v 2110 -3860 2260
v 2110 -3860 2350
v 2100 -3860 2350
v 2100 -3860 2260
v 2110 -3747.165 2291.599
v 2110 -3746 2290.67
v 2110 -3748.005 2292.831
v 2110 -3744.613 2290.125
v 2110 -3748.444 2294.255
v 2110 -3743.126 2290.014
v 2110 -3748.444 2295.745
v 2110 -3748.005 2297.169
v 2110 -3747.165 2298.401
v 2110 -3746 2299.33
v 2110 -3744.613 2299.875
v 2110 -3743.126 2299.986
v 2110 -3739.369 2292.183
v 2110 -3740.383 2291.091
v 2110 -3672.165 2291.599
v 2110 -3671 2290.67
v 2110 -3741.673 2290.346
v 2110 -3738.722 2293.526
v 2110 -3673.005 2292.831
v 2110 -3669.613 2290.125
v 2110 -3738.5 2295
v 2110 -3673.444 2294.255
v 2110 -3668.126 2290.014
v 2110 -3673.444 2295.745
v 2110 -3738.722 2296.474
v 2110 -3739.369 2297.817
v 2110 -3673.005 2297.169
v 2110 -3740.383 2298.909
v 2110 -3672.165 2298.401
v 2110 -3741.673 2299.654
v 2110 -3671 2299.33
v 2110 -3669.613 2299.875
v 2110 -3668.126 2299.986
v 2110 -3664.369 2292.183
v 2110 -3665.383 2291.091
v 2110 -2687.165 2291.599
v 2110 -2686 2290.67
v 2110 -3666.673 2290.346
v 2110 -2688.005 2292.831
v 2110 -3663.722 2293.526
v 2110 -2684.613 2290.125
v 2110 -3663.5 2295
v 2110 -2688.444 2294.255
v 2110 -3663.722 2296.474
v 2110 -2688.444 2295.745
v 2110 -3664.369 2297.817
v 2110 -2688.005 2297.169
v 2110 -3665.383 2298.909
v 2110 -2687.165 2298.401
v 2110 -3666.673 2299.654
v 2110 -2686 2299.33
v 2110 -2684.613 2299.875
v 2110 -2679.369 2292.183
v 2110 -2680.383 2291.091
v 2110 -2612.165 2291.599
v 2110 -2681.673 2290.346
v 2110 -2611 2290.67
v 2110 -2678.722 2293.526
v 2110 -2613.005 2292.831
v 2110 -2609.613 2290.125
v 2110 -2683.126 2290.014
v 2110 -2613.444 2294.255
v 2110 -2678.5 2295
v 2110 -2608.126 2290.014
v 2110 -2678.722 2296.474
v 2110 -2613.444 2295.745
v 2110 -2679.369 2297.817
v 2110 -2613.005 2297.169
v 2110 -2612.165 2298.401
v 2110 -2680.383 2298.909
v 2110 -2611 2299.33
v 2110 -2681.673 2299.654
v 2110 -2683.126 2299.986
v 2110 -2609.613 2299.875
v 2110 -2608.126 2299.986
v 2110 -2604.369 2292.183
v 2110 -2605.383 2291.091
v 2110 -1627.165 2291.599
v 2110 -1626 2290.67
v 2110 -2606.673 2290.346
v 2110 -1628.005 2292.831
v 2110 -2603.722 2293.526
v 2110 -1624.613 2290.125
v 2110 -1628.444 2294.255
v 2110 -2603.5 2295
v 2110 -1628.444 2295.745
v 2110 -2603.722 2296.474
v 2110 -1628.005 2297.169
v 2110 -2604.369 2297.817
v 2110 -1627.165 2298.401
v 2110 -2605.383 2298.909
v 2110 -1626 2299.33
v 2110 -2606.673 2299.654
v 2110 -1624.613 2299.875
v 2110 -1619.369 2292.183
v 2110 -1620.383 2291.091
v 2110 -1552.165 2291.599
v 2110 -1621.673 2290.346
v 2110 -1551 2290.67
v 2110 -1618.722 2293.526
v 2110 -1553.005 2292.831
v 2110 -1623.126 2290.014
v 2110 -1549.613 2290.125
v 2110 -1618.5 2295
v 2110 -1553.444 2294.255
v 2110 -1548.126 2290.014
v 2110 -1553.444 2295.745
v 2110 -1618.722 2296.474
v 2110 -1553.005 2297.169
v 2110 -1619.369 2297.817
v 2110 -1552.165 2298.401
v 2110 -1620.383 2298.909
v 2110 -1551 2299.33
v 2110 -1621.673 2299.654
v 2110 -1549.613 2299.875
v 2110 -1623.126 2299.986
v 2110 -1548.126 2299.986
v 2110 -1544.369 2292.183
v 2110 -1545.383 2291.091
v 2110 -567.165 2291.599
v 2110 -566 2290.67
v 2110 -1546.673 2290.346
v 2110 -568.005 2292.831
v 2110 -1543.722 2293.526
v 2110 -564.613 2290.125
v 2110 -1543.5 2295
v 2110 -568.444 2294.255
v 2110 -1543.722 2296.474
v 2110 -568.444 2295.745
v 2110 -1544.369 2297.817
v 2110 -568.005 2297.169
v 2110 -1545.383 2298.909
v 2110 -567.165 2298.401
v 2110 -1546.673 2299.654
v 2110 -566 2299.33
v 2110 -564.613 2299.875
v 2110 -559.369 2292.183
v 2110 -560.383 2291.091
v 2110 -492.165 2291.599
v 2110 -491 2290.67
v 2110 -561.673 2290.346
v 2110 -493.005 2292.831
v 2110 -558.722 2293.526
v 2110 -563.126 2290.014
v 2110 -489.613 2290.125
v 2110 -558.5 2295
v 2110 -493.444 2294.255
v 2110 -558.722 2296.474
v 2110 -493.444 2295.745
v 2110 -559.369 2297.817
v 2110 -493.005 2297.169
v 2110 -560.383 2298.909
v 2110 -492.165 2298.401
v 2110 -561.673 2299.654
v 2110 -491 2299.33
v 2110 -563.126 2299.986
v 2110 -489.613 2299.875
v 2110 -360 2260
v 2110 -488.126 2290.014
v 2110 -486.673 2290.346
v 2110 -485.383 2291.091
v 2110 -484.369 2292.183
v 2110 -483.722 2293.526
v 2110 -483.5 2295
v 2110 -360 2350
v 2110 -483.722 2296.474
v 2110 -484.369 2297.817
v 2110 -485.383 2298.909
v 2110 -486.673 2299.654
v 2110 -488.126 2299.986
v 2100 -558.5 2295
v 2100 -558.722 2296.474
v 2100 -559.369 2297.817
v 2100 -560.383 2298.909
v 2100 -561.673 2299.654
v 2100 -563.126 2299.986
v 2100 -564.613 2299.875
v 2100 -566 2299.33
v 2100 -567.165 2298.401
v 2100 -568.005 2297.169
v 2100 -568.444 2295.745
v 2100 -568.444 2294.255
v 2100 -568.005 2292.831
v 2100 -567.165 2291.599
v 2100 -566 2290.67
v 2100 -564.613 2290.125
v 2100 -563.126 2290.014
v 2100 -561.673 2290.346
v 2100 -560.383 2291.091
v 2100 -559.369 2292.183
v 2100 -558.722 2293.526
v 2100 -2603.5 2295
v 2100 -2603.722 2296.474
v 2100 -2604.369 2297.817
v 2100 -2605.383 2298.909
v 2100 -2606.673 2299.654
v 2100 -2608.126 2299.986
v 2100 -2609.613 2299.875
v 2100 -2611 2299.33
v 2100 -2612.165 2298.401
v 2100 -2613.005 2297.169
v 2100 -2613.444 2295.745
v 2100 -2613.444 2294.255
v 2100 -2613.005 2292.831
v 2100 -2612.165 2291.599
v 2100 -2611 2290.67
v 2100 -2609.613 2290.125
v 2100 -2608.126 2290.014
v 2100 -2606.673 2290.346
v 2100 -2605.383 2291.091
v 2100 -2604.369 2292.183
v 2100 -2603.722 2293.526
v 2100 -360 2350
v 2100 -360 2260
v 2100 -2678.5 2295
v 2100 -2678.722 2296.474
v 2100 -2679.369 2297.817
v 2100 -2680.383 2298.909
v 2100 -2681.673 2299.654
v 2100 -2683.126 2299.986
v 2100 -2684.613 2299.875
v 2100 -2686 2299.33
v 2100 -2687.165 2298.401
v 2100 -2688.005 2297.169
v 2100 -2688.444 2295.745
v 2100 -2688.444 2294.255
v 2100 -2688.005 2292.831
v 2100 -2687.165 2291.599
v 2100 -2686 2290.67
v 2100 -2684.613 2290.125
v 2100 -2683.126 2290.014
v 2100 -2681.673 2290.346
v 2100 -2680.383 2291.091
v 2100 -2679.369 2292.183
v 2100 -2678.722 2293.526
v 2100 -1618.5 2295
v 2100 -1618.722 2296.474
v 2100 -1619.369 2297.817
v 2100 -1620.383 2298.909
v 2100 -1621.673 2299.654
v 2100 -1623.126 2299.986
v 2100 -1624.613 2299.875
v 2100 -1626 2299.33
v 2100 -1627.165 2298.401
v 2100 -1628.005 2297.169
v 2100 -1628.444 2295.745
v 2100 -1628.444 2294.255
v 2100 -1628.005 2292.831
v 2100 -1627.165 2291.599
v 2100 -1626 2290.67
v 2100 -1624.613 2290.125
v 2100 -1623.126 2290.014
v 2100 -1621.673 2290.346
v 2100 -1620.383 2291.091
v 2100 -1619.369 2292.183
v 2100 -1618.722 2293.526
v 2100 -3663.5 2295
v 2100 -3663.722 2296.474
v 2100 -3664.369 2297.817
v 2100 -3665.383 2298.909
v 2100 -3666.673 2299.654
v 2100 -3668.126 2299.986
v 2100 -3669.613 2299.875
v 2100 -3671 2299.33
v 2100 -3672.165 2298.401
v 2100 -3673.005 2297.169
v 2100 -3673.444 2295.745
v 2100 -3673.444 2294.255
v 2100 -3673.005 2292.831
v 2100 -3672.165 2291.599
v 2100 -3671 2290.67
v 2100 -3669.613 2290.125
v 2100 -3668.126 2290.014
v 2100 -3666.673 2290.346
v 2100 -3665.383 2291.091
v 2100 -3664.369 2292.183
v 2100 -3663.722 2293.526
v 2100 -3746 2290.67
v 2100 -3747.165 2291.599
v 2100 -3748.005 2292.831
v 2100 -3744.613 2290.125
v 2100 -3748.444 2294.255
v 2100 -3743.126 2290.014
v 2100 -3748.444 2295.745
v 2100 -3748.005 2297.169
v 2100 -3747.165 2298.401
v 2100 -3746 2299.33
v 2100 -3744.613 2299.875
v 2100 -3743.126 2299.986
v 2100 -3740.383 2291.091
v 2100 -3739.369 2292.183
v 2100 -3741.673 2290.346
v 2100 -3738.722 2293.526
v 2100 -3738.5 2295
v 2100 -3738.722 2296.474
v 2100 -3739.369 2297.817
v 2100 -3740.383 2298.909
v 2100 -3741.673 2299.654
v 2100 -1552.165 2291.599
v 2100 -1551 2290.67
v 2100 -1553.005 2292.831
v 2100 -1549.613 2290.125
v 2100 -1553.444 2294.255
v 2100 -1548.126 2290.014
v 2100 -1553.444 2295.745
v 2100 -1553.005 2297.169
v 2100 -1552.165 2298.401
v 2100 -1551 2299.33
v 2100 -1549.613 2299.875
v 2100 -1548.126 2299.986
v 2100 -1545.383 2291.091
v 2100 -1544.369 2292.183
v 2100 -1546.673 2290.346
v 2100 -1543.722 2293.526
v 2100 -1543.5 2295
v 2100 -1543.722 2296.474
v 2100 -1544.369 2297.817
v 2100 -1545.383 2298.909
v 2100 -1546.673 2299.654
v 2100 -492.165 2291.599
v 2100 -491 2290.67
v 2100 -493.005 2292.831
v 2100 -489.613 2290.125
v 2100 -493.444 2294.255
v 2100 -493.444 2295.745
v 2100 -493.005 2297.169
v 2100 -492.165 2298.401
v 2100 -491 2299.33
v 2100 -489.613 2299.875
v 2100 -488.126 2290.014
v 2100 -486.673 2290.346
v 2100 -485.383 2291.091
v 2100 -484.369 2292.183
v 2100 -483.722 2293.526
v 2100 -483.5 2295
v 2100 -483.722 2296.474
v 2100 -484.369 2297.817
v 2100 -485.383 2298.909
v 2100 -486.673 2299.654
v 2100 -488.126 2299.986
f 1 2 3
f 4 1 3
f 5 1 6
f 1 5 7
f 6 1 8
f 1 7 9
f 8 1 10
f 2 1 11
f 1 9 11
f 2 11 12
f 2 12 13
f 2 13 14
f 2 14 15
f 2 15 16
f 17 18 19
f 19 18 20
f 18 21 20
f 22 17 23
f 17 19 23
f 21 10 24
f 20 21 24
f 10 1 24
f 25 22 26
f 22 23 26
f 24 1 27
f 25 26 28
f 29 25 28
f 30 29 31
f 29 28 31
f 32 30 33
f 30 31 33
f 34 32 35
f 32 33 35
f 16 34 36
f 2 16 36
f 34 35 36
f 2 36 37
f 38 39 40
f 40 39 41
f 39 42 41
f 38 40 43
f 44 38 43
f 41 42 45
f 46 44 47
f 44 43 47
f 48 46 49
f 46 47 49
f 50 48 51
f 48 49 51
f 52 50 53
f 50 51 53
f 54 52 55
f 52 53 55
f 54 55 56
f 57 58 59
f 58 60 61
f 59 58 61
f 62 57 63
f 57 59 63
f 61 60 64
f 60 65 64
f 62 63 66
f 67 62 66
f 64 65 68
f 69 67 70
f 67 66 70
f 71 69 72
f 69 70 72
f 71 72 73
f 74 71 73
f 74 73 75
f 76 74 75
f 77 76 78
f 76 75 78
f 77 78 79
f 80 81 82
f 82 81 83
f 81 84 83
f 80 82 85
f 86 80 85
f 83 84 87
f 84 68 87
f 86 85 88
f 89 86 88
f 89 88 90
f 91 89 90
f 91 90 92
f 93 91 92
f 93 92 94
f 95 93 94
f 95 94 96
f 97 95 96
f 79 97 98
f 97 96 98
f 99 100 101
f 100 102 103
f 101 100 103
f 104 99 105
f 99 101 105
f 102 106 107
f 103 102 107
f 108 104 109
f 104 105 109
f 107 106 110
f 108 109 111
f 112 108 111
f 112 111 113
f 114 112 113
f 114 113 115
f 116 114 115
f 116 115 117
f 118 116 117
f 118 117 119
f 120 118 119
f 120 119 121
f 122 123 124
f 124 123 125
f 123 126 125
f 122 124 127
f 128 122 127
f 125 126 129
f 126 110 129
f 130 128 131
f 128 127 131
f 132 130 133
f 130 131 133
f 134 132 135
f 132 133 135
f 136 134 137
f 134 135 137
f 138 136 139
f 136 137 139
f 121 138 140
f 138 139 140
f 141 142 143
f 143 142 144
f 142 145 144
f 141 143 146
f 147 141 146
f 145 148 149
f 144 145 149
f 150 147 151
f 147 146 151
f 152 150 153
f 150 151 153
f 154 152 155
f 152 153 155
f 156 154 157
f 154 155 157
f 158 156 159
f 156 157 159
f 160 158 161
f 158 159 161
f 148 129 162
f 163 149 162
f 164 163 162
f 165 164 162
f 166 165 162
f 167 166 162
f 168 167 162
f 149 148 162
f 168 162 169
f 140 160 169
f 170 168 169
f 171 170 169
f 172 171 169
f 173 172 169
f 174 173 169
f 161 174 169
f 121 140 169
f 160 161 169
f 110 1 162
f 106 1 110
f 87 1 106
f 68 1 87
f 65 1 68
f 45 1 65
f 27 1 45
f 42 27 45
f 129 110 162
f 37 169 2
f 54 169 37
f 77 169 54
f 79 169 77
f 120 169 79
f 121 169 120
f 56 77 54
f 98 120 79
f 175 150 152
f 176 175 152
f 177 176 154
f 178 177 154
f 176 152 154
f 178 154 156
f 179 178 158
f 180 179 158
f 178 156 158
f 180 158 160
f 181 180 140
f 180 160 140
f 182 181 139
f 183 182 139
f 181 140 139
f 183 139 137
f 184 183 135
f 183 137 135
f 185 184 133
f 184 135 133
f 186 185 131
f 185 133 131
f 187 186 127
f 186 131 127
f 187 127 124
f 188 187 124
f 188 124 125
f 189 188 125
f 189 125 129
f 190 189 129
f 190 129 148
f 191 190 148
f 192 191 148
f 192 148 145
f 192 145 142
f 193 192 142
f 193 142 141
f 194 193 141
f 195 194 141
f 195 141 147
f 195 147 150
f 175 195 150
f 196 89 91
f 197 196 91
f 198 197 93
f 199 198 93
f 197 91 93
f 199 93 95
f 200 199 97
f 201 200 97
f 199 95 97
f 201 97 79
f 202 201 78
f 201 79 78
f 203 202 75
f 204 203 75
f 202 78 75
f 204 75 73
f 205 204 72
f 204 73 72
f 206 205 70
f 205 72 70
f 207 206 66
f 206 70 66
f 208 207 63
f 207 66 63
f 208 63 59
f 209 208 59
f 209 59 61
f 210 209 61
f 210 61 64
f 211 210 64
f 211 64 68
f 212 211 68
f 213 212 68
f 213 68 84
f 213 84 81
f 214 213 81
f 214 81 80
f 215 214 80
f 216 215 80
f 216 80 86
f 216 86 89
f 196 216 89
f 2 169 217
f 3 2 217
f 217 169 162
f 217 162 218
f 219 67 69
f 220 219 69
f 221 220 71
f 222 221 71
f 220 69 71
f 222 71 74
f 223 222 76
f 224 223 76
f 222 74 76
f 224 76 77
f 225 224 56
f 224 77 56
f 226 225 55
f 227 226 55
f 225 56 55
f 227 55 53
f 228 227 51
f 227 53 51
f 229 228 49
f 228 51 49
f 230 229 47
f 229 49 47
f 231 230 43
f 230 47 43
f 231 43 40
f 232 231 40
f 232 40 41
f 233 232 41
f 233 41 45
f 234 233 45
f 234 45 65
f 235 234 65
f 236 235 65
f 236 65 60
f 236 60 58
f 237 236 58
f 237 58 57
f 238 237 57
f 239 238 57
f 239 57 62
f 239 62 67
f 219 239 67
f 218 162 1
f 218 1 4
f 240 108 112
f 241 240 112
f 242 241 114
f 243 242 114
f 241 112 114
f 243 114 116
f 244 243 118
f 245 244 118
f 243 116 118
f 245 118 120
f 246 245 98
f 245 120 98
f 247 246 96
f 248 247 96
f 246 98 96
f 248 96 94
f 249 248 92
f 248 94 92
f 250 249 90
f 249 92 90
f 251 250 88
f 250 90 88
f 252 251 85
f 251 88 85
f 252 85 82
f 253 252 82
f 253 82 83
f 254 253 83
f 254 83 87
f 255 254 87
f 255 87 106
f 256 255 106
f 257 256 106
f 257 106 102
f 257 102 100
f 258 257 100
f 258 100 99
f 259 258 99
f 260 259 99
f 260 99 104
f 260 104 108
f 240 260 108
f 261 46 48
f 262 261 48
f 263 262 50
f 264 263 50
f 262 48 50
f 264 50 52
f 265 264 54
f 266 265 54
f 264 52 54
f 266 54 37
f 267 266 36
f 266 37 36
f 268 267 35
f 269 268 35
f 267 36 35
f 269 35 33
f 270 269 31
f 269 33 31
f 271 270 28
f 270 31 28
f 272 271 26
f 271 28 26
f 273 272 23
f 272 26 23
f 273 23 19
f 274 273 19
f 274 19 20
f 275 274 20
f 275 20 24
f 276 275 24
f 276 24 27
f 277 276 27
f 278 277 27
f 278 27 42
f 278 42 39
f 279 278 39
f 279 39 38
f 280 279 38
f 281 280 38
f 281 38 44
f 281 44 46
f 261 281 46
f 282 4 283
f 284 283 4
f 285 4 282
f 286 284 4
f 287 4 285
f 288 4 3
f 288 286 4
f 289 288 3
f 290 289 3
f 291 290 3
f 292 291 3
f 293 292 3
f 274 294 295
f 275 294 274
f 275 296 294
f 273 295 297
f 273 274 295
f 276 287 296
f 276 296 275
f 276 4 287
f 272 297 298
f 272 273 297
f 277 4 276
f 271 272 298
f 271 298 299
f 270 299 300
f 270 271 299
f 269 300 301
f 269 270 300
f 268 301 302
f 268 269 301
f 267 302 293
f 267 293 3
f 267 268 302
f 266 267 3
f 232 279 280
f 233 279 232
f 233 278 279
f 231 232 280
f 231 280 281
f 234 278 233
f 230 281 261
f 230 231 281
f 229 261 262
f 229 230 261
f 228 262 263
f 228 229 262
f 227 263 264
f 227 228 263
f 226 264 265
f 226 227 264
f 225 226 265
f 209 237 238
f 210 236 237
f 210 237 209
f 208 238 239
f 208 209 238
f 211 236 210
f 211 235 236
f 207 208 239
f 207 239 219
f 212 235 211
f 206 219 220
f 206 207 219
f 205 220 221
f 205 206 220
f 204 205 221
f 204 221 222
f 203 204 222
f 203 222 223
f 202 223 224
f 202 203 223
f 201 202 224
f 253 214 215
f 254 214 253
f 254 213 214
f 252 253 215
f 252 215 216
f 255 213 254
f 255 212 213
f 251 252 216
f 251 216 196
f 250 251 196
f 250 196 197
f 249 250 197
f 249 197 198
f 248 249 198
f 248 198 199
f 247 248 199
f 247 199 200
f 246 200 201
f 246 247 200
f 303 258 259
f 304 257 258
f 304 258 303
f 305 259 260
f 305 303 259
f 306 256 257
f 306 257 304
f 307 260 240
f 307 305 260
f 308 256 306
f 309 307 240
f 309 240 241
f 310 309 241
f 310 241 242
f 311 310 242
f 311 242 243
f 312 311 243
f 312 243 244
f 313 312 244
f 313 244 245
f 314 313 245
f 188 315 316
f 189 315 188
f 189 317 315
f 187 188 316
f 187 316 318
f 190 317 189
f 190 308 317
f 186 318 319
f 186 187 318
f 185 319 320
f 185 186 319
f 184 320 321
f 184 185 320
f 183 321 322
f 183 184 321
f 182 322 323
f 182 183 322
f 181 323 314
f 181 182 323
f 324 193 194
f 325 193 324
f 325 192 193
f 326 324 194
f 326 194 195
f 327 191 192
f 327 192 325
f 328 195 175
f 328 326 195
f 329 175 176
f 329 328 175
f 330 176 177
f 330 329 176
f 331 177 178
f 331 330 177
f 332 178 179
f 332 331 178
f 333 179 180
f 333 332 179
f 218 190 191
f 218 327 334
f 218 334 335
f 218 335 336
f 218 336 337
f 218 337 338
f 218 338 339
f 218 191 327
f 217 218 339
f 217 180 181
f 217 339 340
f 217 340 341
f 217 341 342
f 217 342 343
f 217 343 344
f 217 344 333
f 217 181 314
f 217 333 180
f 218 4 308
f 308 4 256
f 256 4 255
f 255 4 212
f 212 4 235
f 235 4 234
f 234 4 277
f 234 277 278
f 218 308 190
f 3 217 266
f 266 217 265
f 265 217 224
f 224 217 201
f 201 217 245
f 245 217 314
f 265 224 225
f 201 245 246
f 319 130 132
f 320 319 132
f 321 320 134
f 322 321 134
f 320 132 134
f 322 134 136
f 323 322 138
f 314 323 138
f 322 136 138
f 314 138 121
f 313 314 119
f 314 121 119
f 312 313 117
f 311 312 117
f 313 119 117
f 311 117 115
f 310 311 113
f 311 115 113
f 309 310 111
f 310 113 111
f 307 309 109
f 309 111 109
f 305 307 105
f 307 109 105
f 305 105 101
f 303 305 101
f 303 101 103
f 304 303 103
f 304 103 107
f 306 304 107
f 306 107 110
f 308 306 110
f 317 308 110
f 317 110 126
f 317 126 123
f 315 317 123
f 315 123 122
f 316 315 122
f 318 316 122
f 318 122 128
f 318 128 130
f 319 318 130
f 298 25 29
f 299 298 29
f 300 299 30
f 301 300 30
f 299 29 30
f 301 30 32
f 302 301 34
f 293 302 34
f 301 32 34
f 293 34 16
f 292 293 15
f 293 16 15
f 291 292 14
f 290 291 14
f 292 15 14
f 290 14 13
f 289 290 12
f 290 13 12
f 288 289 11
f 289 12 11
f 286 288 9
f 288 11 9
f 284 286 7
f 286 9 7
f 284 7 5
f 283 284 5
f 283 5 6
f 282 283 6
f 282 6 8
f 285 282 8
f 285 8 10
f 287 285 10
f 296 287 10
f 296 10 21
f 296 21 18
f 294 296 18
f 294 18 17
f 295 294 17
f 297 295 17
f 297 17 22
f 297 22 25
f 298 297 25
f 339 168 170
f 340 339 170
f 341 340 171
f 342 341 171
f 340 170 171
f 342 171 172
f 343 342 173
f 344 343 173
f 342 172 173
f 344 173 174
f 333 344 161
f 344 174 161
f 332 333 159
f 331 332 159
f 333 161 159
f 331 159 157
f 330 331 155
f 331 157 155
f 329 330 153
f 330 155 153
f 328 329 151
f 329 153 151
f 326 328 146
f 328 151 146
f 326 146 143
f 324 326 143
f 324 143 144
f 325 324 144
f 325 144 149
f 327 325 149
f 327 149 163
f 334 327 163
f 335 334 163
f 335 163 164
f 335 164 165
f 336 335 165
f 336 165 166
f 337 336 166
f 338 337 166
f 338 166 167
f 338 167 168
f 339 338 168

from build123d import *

# Parameters (mm, degrees)
CIRCLE012_R                                  = 5
EXTRUDE019_DEPTH                             = 100
ARRAY012_X_COUNT                             = 2
ARRAY012_X_PITCH                             = 75
ARRAY012_Y_COUNT                             = 4
ARRAY012_Y_PITCH                             = 1060
RECTANGLE002_AS_DRAWN_W                      = 10
RECTANGLE002_AS_DRAWN_H                      = 90
EXTRUDE003_DEPTH                             = 3500
EXTRUDE003_ONTO_RECTANGLE002_ROLL_ANGLE      = 90
EXTRUDE003_ONTO_RECTANGLE002_PLACEMENT_ANGLE = 180


with BuildPart() as array012:
    # Circle012 → Extrude019 (new body)
    with BuildSketch(Plane(origin=(2132, -488.5, 2295), x_dir=(0, 1, 0), z_dir=(1, 0, 0))):
        Circle(CIRCLE012_R)
    extrude(amount=-EXTRUDE019_DEPTH)

    # Array012 X: Array012 ×2


with BuildPart() as array012_1:
    add(array012.part)
    with Locations(*[(0, -i * ARRAY012_X_PITCH, 0) for i in range(1, ARRAY012_X_COUNT)]):
        add(array012.part)

    # Array012 Y: Array012 ×4


with BuildPart() as array012_2:
    add(array012_1.part)
    with Locations(*[(0, -i * ARRAY012_Y_PITCH, 0) for i in range(1, ARRAY012_Y_COUNT)]):
        add(array012_1.part)


with BuildPart() as cut:
    # Rectangle002 as drawn → Extrude003 (new)
    with BuildSketch(Plane.XY):
        with Locations((5, 45)):
            Rectangle(RECTANGLE002_AS_DRAWN_W, RECTANGLE002_AS_DRAWN_H)
    extrude(amount=-EXTRUDE003_DEPTH)


with BuildPart() as cut_1:
    # Extrude003 onto Rectangle002 roll: moved
    add(cut.part.rotate(Axis((0, 0, 0), (1, 0, 0)), EXTRUDE003_ONTO_RECTANGLE002_ROLL_ANGLE))


with BuildPart() as cut_2:
    # Extrude003 onto Rectangle002 placement: moved
    add(cut_1.part.moved(Location((2110, -360, 2260))).rotate(Axis((2110, -360, 2260), (0, 0, 1)), EXTRUDE003_ONTO_RECTANGLE002_PLACEMENT_ANGLE))

    # Cut: cut Array012
    add(array012_2.part, mode=Mode.SUBTRACT)


solid = cut_2.part
